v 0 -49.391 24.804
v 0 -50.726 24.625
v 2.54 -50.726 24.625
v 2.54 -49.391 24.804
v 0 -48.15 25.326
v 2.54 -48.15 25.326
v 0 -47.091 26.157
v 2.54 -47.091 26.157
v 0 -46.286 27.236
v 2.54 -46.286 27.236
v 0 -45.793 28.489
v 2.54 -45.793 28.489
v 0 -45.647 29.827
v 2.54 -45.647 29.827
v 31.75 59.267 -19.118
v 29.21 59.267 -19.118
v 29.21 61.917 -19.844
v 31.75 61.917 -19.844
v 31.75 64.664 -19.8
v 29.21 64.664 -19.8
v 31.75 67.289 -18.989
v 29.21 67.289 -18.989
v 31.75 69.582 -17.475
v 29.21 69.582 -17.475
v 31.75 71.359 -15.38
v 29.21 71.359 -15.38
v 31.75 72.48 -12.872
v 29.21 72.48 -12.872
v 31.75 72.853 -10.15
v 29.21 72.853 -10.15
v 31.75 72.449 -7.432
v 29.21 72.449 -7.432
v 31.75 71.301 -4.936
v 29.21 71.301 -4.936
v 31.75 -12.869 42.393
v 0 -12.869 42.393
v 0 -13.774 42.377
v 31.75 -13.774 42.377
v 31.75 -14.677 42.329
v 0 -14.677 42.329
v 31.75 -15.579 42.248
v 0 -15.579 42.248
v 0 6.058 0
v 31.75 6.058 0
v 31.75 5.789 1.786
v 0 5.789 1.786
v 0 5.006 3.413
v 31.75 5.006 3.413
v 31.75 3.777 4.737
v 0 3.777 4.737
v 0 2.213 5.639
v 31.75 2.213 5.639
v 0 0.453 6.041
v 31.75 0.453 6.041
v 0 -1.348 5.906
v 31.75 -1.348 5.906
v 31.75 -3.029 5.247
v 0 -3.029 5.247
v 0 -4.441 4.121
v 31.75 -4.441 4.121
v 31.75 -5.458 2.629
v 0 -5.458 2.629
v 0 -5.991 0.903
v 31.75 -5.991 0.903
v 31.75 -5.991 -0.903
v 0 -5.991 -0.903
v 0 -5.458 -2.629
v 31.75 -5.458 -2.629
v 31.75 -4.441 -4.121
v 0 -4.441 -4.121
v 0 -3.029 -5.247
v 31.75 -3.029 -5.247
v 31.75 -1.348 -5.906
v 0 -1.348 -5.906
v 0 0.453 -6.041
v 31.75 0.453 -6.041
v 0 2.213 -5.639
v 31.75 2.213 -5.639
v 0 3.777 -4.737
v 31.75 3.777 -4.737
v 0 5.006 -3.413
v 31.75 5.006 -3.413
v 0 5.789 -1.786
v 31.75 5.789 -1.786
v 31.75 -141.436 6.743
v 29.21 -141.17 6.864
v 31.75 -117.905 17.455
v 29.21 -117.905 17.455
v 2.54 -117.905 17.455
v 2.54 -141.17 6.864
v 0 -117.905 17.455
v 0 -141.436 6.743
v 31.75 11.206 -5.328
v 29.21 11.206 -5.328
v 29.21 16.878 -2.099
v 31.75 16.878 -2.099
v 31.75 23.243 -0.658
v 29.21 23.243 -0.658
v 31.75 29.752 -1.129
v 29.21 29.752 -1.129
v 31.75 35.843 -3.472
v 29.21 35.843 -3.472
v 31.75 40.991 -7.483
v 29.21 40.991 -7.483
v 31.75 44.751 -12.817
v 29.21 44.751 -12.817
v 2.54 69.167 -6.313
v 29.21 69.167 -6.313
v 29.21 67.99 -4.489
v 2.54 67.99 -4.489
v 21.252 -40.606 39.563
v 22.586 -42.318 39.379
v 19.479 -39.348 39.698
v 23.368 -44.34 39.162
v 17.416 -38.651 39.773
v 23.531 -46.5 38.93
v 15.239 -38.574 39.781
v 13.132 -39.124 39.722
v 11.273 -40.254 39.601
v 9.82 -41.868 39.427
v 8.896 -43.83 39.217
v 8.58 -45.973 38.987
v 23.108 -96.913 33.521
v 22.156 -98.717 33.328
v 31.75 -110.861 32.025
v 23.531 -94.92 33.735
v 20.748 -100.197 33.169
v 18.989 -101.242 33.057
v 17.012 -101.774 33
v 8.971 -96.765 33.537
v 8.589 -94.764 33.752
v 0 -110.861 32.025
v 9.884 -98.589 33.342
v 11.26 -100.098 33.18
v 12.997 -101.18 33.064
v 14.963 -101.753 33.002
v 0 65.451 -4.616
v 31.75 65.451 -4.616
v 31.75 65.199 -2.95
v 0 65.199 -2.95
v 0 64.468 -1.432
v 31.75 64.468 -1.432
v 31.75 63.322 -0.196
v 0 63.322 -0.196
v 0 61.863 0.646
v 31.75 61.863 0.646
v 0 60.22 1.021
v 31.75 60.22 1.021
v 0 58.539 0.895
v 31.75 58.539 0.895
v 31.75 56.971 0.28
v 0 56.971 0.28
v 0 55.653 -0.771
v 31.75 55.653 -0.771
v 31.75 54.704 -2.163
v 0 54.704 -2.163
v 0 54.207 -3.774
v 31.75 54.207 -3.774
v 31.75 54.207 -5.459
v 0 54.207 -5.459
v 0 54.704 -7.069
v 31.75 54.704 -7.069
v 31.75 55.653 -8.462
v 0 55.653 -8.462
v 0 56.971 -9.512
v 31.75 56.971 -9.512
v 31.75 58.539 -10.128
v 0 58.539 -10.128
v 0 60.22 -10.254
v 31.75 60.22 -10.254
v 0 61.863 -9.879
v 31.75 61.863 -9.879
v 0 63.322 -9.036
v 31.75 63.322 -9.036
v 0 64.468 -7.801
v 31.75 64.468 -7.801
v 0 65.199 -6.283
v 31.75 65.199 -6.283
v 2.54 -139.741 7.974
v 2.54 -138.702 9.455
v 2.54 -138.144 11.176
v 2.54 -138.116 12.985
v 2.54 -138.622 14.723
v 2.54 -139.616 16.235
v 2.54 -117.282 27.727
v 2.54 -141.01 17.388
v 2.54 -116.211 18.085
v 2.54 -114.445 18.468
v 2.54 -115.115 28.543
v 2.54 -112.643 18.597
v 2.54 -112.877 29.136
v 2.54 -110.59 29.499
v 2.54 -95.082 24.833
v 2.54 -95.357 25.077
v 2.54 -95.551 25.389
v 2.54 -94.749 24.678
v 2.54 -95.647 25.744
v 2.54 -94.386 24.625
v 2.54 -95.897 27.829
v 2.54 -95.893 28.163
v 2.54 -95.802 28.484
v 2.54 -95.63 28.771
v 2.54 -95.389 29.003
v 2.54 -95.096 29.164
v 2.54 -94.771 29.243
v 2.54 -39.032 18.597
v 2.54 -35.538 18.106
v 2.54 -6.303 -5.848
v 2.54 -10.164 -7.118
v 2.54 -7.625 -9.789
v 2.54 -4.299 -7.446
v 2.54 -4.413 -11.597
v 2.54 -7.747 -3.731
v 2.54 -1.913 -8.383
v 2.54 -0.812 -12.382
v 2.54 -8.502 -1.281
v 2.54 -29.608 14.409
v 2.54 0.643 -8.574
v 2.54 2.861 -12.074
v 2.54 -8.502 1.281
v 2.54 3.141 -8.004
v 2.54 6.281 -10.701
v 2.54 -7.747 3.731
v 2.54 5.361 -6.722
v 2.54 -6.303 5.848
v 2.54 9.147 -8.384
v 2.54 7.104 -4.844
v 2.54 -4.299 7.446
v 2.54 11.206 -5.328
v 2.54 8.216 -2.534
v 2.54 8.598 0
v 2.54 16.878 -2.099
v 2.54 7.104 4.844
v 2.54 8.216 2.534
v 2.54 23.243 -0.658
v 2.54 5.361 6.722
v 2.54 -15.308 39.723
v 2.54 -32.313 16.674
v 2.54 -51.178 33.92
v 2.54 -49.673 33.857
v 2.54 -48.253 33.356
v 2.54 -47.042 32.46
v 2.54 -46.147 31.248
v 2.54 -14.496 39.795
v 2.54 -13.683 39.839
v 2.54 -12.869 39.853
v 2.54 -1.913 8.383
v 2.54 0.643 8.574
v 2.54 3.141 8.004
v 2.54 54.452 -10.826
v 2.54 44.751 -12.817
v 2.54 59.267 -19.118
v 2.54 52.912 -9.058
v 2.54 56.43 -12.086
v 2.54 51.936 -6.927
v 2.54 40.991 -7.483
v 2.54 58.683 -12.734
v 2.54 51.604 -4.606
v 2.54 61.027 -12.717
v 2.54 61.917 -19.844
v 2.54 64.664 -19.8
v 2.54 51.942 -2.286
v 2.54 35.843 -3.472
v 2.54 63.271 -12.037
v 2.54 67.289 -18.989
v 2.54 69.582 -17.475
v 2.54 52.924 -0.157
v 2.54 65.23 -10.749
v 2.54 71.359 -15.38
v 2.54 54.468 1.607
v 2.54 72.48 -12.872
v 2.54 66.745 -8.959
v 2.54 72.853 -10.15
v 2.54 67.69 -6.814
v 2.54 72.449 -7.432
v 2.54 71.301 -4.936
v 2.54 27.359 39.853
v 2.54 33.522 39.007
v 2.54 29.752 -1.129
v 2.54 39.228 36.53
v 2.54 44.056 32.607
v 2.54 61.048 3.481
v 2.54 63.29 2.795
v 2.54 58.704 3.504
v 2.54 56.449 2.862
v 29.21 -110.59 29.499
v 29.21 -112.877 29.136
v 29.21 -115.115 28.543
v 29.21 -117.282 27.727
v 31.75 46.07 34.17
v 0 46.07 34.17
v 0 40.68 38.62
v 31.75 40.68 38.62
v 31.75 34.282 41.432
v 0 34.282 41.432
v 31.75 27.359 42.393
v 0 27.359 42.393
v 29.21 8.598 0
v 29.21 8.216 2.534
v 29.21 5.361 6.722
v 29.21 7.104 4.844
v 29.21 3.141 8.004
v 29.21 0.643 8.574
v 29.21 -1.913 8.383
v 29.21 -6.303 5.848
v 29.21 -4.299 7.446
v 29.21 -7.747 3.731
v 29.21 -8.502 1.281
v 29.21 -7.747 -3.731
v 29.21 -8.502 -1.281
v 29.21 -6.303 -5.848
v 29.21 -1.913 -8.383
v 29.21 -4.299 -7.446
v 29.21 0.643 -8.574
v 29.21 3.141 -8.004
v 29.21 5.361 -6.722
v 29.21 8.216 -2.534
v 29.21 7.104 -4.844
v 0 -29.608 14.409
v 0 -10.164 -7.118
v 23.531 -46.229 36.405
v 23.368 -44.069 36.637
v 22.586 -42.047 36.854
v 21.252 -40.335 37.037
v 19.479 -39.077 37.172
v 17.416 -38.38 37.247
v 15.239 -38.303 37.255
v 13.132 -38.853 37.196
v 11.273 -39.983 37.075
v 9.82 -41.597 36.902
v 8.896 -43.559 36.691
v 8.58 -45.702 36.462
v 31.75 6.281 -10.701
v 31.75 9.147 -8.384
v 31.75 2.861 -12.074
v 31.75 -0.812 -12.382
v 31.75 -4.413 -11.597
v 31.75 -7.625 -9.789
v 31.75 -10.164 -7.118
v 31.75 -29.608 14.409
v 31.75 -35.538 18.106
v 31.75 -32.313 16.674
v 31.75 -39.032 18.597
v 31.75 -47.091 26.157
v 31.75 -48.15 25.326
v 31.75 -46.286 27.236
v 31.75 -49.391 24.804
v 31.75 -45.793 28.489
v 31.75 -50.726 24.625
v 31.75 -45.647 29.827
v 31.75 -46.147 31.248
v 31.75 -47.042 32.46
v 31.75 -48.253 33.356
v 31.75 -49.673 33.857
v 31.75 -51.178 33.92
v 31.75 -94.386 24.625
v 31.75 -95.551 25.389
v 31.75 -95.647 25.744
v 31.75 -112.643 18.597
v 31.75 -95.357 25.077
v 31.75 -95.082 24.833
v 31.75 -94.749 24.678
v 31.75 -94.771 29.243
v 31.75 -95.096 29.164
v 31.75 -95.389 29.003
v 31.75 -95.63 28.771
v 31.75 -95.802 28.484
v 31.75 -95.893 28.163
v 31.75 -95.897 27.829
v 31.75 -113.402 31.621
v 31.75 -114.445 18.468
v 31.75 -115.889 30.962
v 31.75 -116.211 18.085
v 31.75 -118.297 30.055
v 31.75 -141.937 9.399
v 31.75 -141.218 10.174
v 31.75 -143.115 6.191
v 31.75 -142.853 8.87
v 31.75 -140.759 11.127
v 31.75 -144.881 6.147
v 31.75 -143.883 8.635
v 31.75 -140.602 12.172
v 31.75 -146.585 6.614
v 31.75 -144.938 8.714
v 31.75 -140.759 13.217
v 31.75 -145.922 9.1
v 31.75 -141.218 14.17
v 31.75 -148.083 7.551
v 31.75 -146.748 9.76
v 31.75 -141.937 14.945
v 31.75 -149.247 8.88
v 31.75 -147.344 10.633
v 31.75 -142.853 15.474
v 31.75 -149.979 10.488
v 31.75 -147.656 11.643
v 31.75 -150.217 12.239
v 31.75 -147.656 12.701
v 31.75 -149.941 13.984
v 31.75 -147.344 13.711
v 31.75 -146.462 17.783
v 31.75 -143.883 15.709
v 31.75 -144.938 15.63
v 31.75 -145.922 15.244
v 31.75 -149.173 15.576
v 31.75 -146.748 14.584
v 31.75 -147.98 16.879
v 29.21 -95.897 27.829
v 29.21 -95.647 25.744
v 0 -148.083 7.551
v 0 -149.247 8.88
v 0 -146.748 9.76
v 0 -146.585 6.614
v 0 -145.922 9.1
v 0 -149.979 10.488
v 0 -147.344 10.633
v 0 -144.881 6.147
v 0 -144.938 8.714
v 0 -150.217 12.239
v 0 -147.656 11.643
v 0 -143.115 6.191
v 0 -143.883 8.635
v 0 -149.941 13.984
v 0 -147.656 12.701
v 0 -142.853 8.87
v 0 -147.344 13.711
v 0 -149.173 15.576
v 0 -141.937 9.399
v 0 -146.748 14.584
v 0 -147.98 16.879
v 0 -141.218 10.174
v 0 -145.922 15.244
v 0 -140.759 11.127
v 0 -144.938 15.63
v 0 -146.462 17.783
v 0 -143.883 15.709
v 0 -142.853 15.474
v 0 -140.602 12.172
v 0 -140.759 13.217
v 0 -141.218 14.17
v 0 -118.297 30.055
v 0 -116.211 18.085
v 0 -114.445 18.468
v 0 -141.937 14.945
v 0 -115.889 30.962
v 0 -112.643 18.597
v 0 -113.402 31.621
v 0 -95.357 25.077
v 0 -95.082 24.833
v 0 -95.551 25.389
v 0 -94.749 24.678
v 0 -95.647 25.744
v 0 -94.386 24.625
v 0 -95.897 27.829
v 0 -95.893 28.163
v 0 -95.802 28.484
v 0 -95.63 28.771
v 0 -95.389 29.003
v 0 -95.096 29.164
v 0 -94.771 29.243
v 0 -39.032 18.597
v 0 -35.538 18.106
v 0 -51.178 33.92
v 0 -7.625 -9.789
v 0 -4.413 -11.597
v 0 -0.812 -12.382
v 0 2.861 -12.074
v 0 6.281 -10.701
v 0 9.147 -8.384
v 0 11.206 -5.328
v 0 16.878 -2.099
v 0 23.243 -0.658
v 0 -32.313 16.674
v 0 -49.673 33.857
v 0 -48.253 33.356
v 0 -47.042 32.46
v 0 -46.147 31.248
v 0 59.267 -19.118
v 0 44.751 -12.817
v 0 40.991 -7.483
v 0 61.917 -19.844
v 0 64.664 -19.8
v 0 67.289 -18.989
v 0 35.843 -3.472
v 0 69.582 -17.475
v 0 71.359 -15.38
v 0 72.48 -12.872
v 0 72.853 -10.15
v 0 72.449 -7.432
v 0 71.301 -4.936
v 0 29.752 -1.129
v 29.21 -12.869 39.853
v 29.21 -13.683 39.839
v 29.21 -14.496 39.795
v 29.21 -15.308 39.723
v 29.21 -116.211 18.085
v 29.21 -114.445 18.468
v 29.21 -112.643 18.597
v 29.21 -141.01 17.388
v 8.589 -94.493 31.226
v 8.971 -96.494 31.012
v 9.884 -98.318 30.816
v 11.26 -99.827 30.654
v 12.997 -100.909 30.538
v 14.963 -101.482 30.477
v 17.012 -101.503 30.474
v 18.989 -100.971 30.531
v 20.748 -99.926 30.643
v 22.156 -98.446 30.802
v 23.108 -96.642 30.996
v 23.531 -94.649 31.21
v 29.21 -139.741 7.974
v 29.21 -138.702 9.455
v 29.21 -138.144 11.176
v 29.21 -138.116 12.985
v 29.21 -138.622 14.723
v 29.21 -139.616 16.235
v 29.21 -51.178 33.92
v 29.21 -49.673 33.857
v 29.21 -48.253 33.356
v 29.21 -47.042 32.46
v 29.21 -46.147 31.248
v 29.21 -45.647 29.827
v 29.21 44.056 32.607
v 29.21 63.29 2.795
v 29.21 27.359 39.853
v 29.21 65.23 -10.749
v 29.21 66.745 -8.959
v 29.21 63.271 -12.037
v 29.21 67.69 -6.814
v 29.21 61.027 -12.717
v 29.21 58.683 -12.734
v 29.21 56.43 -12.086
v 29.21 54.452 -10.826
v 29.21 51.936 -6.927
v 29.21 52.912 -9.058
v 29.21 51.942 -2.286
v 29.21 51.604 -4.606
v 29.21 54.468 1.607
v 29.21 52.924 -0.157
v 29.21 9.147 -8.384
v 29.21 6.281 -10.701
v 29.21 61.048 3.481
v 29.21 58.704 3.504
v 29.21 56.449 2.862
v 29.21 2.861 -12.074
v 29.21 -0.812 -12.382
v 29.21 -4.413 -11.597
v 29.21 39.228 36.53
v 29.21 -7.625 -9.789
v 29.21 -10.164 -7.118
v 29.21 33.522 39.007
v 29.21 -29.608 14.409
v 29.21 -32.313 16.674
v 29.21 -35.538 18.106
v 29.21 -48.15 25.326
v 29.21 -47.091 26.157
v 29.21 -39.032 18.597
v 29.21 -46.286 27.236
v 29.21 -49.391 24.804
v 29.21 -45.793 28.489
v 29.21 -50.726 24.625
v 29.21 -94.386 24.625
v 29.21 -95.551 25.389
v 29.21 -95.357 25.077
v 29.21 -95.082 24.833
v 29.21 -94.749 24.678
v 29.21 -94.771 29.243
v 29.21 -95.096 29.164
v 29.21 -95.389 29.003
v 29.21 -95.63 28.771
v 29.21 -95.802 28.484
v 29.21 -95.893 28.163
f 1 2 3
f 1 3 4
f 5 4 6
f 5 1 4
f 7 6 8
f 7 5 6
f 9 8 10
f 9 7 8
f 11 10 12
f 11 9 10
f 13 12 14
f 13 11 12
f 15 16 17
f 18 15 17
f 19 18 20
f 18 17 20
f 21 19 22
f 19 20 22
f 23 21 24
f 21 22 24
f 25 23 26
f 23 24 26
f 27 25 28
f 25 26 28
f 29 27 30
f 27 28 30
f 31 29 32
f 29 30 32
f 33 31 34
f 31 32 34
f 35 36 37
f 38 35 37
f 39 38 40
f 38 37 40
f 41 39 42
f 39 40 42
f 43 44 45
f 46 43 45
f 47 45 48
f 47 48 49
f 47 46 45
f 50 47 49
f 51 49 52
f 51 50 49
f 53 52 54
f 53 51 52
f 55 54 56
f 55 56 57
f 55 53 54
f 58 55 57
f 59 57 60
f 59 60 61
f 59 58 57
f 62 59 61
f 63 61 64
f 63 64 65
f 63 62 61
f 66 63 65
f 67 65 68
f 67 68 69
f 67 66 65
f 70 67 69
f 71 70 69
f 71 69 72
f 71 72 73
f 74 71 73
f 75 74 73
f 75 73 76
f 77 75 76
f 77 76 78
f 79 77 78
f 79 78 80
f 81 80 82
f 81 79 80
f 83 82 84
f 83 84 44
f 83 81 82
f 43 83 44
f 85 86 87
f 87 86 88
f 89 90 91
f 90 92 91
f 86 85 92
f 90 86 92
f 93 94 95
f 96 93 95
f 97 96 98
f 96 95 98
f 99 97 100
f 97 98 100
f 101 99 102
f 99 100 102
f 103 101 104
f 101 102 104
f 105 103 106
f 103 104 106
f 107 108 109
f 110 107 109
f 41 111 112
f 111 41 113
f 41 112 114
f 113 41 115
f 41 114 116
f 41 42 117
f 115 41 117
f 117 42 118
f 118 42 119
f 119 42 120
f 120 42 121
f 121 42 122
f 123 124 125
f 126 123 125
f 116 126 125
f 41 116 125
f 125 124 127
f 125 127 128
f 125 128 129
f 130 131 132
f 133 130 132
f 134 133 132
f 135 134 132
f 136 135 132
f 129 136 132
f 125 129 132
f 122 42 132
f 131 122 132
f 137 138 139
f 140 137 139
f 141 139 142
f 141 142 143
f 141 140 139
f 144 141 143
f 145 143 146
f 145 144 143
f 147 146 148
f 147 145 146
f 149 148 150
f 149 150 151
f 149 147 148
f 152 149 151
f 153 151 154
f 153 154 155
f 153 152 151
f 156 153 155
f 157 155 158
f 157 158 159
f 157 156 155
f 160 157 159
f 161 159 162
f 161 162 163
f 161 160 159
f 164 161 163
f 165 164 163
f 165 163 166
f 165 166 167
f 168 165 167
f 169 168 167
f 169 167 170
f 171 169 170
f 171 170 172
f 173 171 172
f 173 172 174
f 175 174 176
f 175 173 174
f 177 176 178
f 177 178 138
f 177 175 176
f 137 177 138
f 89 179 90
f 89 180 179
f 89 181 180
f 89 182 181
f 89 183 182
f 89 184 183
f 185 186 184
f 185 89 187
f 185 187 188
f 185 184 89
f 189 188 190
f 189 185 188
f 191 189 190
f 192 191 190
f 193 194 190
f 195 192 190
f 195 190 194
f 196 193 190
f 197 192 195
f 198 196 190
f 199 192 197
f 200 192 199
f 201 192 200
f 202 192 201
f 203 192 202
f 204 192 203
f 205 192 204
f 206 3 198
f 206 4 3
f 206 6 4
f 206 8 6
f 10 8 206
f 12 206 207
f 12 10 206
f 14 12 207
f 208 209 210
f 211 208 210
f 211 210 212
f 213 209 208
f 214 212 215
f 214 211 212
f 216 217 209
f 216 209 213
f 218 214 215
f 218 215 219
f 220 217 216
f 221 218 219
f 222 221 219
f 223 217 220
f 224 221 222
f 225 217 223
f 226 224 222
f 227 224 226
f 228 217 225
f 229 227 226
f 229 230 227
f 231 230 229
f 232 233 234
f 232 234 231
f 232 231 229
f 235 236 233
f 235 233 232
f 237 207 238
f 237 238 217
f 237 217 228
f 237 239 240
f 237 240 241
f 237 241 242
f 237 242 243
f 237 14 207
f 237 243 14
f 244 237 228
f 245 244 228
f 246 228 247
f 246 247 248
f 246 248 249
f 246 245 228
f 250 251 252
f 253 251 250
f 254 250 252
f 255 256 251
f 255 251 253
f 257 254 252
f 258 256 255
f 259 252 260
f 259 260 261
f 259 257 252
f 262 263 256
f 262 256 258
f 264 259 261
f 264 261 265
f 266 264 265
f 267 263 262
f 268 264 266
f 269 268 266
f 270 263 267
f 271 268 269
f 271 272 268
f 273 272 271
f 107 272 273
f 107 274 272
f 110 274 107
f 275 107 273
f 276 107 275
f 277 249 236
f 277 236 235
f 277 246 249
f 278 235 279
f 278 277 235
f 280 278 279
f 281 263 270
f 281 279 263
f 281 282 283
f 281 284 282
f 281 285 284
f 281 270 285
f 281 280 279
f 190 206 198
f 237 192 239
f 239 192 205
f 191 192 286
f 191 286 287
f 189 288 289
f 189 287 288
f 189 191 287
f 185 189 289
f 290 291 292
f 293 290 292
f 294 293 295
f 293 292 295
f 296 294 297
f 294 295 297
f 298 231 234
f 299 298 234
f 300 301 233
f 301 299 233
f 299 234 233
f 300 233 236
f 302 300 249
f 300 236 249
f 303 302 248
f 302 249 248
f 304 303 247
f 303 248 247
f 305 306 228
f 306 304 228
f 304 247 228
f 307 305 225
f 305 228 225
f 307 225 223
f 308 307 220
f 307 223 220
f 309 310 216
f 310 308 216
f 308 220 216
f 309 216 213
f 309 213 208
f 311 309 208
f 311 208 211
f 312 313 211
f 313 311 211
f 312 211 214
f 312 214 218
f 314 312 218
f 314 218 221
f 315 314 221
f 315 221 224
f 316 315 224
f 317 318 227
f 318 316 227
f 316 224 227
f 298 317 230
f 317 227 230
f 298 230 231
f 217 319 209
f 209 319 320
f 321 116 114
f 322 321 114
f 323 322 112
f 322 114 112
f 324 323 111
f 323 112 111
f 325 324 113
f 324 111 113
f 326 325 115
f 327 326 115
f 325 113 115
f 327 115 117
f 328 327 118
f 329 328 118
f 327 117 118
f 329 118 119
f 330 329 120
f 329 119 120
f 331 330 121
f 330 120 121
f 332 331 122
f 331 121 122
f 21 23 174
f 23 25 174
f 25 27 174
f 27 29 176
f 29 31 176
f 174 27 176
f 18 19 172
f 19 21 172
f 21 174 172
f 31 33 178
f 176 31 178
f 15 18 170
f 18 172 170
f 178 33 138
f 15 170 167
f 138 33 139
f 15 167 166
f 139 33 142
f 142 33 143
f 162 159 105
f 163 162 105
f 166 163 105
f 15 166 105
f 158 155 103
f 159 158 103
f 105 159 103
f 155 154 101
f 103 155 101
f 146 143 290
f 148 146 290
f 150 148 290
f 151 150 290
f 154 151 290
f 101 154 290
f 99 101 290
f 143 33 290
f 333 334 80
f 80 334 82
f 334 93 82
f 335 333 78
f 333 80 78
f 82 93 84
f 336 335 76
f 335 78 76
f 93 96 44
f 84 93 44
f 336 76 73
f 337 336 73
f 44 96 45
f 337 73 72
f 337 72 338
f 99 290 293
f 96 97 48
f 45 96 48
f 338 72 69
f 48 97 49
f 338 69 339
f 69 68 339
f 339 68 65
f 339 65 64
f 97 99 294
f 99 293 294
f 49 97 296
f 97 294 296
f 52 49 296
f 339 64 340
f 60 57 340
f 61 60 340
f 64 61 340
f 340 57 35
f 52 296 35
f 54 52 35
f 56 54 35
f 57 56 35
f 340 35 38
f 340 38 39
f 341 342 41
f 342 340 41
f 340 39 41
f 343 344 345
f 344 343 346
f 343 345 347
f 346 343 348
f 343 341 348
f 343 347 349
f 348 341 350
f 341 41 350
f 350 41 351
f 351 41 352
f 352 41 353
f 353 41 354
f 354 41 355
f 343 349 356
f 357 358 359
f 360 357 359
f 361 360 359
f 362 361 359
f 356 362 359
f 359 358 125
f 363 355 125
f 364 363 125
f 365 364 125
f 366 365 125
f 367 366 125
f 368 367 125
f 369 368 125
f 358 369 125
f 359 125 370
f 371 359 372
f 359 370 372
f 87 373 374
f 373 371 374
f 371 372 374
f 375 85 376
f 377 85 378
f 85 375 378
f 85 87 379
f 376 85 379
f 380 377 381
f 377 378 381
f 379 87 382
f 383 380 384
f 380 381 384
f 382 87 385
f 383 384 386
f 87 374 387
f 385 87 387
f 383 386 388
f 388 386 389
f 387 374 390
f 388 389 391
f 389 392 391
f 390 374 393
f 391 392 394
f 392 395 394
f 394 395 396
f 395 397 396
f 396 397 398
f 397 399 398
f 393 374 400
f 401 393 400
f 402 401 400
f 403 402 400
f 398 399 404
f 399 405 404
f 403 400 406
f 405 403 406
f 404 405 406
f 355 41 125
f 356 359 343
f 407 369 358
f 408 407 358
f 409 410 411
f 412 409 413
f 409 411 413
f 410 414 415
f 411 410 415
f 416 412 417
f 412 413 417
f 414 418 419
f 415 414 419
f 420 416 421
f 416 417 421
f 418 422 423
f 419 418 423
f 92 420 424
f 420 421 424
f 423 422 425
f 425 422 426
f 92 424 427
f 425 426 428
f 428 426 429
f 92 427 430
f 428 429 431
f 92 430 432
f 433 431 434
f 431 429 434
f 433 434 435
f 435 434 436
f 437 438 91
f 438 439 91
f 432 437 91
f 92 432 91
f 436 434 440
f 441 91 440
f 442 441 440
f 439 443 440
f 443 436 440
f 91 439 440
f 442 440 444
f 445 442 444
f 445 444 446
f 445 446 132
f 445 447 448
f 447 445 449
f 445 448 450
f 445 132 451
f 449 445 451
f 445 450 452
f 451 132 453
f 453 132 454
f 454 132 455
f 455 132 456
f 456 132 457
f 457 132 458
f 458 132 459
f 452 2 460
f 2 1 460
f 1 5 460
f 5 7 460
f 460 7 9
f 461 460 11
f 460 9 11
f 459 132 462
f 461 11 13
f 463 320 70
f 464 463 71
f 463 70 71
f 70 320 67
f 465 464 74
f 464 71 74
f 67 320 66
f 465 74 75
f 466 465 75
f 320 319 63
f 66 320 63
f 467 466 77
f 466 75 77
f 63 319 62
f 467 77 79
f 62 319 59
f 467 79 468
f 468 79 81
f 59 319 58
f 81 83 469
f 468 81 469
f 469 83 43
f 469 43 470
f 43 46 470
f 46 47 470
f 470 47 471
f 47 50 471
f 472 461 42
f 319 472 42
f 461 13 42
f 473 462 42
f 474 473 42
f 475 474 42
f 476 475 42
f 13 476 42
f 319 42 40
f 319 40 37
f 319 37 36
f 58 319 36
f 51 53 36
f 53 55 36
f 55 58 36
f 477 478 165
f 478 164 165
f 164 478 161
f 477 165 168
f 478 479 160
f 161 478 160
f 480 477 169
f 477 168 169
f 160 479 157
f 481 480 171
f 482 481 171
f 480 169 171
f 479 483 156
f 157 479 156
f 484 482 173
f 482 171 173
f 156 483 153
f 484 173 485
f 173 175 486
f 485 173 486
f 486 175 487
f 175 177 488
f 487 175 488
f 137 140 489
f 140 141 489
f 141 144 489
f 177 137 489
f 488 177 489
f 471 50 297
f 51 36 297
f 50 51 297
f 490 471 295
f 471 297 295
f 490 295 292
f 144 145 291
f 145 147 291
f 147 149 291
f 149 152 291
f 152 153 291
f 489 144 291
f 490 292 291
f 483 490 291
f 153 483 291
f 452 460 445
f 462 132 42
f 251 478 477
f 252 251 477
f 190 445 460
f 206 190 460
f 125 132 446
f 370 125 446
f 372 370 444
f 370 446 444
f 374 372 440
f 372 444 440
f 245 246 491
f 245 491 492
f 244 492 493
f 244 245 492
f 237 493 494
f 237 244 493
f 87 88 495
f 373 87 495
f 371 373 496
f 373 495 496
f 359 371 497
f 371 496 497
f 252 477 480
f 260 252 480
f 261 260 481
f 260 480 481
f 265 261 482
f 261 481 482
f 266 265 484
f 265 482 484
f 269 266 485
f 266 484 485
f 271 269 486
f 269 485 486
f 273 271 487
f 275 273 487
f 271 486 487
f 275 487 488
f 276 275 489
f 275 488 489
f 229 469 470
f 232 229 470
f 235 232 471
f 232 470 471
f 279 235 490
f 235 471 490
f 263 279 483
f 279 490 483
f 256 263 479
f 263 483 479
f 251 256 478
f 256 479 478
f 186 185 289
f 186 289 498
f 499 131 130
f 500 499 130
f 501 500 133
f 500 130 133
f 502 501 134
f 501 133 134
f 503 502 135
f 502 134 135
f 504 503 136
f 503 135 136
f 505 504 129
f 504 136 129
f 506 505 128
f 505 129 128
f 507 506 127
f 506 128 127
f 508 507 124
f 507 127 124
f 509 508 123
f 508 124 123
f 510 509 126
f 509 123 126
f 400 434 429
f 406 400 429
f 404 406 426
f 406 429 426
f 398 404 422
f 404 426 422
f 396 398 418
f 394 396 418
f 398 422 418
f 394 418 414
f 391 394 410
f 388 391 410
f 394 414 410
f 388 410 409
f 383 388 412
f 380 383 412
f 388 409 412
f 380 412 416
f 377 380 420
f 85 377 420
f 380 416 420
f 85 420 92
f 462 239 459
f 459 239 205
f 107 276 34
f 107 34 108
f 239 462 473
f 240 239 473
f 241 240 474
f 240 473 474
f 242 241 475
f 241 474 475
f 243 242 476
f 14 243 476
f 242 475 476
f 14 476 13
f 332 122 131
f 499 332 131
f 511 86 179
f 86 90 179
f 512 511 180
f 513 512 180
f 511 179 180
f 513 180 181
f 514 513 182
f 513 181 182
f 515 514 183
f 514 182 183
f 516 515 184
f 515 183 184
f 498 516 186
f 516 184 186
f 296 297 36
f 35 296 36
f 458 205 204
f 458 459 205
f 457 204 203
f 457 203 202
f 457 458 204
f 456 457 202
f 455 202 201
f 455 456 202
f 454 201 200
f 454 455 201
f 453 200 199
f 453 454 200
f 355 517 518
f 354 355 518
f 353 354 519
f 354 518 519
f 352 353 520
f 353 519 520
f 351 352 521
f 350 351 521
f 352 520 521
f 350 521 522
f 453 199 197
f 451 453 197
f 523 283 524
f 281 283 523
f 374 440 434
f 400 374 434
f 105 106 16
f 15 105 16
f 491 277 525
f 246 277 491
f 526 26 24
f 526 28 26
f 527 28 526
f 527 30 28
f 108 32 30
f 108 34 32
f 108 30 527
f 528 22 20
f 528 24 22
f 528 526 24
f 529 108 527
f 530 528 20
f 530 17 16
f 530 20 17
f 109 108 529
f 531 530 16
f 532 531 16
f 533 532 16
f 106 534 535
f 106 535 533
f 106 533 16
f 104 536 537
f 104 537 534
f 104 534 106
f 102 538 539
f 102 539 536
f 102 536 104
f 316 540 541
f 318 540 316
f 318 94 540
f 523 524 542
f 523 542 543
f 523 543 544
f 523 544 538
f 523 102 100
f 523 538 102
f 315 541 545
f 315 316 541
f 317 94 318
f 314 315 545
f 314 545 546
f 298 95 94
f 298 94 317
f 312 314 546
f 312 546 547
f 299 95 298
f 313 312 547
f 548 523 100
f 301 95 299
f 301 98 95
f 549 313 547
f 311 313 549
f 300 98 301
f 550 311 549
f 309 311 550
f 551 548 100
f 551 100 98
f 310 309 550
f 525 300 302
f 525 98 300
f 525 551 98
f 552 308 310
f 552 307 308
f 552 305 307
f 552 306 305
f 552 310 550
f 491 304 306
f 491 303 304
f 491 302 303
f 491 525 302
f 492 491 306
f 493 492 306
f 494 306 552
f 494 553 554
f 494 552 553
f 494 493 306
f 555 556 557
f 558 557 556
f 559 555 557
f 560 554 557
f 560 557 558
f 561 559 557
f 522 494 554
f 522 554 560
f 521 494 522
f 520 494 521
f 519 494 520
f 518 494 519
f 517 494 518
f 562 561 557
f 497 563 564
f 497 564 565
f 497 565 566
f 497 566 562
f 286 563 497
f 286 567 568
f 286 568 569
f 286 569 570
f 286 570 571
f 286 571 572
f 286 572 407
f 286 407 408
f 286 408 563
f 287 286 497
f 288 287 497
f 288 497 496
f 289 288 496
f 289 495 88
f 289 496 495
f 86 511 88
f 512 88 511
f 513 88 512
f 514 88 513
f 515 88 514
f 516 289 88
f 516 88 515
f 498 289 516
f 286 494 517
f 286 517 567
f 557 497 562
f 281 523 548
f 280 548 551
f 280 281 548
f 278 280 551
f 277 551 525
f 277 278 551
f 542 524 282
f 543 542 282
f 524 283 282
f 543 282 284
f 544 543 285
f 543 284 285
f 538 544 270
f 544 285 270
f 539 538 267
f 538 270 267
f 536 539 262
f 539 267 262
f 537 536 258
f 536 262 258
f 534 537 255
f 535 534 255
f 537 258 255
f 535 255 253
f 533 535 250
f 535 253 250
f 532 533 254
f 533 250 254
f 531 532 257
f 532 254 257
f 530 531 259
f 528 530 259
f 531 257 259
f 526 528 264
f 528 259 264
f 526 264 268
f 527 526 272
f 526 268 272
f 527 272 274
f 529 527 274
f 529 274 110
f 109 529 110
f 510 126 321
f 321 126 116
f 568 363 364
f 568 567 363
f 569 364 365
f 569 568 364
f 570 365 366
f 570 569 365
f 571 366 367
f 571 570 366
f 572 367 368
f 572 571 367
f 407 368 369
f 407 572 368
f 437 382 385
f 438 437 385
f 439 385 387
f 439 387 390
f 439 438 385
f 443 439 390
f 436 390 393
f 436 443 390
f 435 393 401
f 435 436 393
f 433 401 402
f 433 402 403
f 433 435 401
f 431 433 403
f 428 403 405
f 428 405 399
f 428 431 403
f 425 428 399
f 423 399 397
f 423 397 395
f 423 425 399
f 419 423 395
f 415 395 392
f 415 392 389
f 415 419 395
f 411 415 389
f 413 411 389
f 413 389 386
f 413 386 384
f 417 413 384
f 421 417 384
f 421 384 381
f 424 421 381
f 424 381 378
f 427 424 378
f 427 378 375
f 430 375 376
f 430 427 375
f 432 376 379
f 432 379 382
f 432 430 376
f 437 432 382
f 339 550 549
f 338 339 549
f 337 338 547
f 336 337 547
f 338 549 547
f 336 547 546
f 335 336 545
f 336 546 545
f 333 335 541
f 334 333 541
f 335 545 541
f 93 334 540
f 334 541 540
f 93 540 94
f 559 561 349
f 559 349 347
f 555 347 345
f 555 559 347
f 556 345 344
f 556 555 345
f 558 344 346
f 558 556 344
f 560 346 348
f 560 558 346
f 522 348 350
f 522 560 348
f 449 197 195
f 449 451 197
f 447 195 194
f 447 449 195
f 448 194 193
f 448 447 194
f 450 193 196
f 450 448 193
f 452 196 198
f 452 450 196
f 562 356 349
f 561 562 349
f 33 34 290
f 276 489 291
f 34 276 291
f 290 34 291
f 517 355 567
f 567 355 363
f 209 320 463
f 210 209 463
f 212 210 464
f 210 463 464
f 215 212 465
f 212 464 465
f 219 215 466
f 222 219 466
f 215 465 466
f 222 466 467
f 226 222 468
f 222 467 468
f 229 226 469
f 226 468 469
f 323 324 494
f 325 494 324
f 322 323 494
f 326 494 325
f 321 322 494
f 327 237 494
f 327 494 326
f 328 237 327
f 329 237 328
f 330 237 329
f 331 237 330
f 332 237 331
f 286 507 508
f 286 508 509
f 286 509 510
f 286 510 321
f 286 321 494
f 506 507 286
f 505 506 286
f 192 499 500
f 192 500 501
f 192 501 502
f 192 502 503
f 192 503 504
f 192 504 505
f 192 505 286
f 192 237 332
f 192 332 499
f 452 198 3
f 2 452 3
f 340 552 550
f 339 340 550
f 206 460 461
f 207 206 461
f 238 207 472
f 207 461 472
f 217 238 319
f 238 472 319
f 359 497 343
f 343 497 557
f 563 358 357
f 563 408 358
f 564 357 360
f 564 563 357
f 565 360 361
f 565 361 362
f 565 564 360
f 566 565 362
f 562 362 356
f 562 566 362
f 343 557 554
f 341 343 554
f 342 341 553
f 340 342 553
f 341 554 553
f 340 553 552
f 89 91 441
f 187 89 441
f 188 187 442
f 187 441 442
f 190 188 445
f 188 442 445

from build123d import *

# Parameters (mm, degrees)
F0_R        = 5.6533409101
F0_R_2      = 6.0582147302
F0_R_3      = 3.5468264326
F1_DEPTH    = 31.75
F2_T        = 2.54
F2_T3_DEPTH = 36.83
F4_DEPTH    = 25.4
F6_DEPTH    = 31.751
F7_T1_DEPTH = 2.54
F7_T3_DEPTH = 2.54
F8_R        = 1.27


# Not quite as in the source:
# - a fillet or chamfer that OpenCascade refuses, or shapes differently, is made with other operations: its cross-section is extruded or revolved along the edge and cut away or added
# - a shell that OpenCascade refuses in one call is made with other operations: the cavity is built on its own and cut out


with BuildPart() as f1:
    # F0 (on Right) → F1 (new body)
    with BuildSketch(Plane.YZ):
        with BuildLine():
            Line((-118.2969192854, 30.0553025028), (-146.4621126652, 17.7829619497))
            ThreePointArc((-146.4621126652, 17.7829619497), (-149.6721200055, 9.657338463), (-141.4359788777, 6.7425685756))
            Line((-141.4359788777, 6.7425685756), (-117.9046317908, 17.455203049))
            ThreePointArc((-117.9046317908, 17.455203049), (-115.3347971308, 18.3079832041), (-112.6425907814, 18.5966164392))
            Line((-112.6425907814, 18.5966164392), (-39.032237408, 18.5966164392))
            ThreePointArc((-39.032237408, 18.5966164392), (-33.875711062, 17.5026595222), (-29.6075339545, 14.4092520366))
            Line((-29.6075339545, 14.4092520366), (-10.1635284412, -7.1180392256))
            ThreePointArc((-10.1635284412, -7.1180392256), (1.0358015594, -12.3649063046), (11.2061193672, -5.3279153072))
            ThreePointArc((11.2061193672, -5.3279153072), (29.7519512617, -1.1293262164), (44.7507215315, -12.8174792531))
            Line((44.7507215315, -12.8174792531), (59.2673632914, -19.1176440206))
            ThreePointArc((59.2673632914, -19.1176440206), (70.5449926496, -16.490786447), (71.3009120761, -4.9359653548))
            Line((71.3009120761, -4.9359653548), (46.0699528524, 34.1704526075))
            ThreePointArc((46.0699528524, 34.1704526075), (37.5779975797, 40.2467968073), (27.3589767296, 42.3931602559))
            Line((27.3589767296, 42.3931602559), (-12.8688071267, 42.3931602559))
            ThreePointArc((-12.8688071267, 42.3931602559), (-14.2256285087, 42.3568949126), (-15.5785754345, 42.2482024399))
            Line((-15.5785754345, 42.2482024399), (-110.8605493232, 32.0248153133))
            ThreePointArc((-110.8605493232, 32.0248153133), (-114.6537287056, 31.3232183323), (-118.2969192854, 30.0553025028))
        make_face()
        with Locations((59.7972124815, -4.6163224615)):
            Circle(F0_R, mode=Mode.SUBTRACT)
        Circle(F0_R_2, mode=Mode.SUBTRACT)
        with Locations((-144.1483274102, 12.1720423922)):
            Circle(F0_R_3, mode=Mode.SUBTRACT)
    extrude(amount=F1_DEPTH)

    # F2: shell of thickness 2.54, made by hand


with BuildPart() as f2_core1:
    # F2_t2: copy of F1
    add(f1.part)

    # the walls: a layer under each face that stays
    f2_faces = [f2_core1.faces().sort_by_distance(p)[0] for p in [
        (15.875, -63.2195623789, 37.1365088766),
        (15.875, -114.6537287056, 31.3232183323),
        (15.875, -132.3795159753, 23.9191322262),
        (15.875, -149.6721200055, 9.657338463),
        (15.875, 58.6854324642, 14.6172436263),
        (15.875, 37.5779975797, 40.2467968073),
        (15.875, 7.2450848014, 42.3931602559),
        (15.875, -14.2256285087, 42.3568949126),
        (15.875, 54.1438715714, -4.6163224615),
        (15.875, -6.0582147302, 0),
        (15.875, -147.6951538428, 12.1720423922),
        (0, -38.6823777389, 32.0074819355),
        (31.75, -38.6823777389, 32.0074819355),
    ]]
    thicken(f2_faces, amount=-F2_T, mode=Mode.SUBTRACT)

    # F2_s4 → F2_t3 (cut)
    with BuildSketch(Plane.YZ.offset(-2.54)):
        Polygon((-146.4819420371, 17.8297292802), (-145.4474988382, 15.4544090123), (-145.4705469322, 15.4443663311), (-145.4937892966, 15.4347818344), align=None)
    extrude(amount=F2_T3_DEPTH, mode=Mode.SUBTRACT)


with BuildPart() as f1_1:
    add(f1.part)

    # what is left inside the walls is the cavity
    f2_cavity = [f2_core1.part.solids().sort_by_distance(p)[0] for p in [
        (29.1846, -87.664257, 19.92847),
    ]]
    add(f2_cavity, mode=Mode.SUBTRACT)

    # F3 (on face) → F4 (cut)
    with BuildSketch(Plane(origin=(0, -4.6587823298, 43.4198539884), x_dir=(1, 0, 0), z_dir=(0, -0.1066837916, 0.9942929994))):
        with BuildLine():
            Line((8.5797651154, -41.550964987), (8.5891456531, -90.6220046018))
            ThreePointArc((8.5891456531, -90.6220046018), (15.9863896259, -97.7322088228), (23.5313536211, -90.7789548531))
            Line((23.5313536211, -90.7789548531), (23.5313536211, -42.0811111897))
            ThreePointArc((23.5313536211, -42.0811111897), (16.3302504196, -34.0689910553), (8.5797651154, -41.550964987))
        make_face()
    extrude(amount=-F4_DEPTH, mode=Mode.SUBTRACT)

    # F5 (on face) → F6 (cut, through all)
    with BuildSketch(Plane.YZ.offset(31.75)):
        Polygon((-46.1267865209, 34.4621779106), (-96.0500612855, 29.1056036949), (-95.512650907, 24.6252825343), (-45.0713257087, 24.6252825343), align=None)
    extrude(amount=-F6_DEPTH, mode=Mode.SUBTRACT)

    # F7: fillet of radius 5.08 on 4 edges, made by hand

    # F7_s2 → F7_t1 (join)
    with BuildSketch(Plane.YZ.offset(29.21)):
        with BuildLine():
            ThreePointArc((-50.7255480205, 24.6252825343), (-46.9466907461, 26.3101922999), (-45.6745395837, 30.2472361958))
            Line((-45.6745395837, 30.2472361958), (-45.0713257087, 24.6252825343))
            Line((-45.0713257087, 24.6252825343), (-50.7255480205, 24.6252825343))
        make_face()
        with BuildLine():
            ThreePointArc((-51.1777949577, 33.920224249), (-47.4474580879, 32.8240372389), (-45.5848328594, 29.4111694737))
            Line((-45.5848328594, 29.4111694737), (-46.1267865209, 34.4621779106))
            Line((-46.1267865209, 34.4621779106), (-51.1777949577, 33.920224249))
        make_face()
    extrude(amount=F7_T1_DEPTH)

    # F7_s4 → F7_t3 (join)
    with BuildSketch(Plane.YZ):
        with BuildLine():
            ThreePointArc((-51.1777949577, 33.920224249), (-47.4474580879, 32.8240372389), (-45.5848328594, 29.4111694737))
            Line((-45.5848328594, 29.4111694737), (-46.1267865209, 34.4621779106))
            Line((-46.1267865209, 34.4621779106), (-51.1777949577, 33.920224249))
        make_face()
        with BuildLine():
            ThreePointArc((-50.7255480205, 24.6252825343), (-46.9466907461, 26.3101922999), (-45.6745395837, 30.2472361958))
            Line((-45.6745395837, 30.2472361958), (-45.0713257087, 24.6252825343))
            Line((-45.0713257087, 24.6252825343), (-50.7255480205, 24.6252825343))
        make_face()
    extrude(amount=F7_T3_DEPTH)

    # F8
    f8_edges = [f1_1.edges().sort_by_distance(p)[0] for p in [
        (30.48, -96.050061, 29.105604),
        (30.48, -95.512651, 24.625283),
        (1.27, -96.050061, 29.105604),
        (1.27, -95.512651, 24.625283),
    ]]
    fillet(f8_edges, radius=F8_R)


solid = f1_1.part
